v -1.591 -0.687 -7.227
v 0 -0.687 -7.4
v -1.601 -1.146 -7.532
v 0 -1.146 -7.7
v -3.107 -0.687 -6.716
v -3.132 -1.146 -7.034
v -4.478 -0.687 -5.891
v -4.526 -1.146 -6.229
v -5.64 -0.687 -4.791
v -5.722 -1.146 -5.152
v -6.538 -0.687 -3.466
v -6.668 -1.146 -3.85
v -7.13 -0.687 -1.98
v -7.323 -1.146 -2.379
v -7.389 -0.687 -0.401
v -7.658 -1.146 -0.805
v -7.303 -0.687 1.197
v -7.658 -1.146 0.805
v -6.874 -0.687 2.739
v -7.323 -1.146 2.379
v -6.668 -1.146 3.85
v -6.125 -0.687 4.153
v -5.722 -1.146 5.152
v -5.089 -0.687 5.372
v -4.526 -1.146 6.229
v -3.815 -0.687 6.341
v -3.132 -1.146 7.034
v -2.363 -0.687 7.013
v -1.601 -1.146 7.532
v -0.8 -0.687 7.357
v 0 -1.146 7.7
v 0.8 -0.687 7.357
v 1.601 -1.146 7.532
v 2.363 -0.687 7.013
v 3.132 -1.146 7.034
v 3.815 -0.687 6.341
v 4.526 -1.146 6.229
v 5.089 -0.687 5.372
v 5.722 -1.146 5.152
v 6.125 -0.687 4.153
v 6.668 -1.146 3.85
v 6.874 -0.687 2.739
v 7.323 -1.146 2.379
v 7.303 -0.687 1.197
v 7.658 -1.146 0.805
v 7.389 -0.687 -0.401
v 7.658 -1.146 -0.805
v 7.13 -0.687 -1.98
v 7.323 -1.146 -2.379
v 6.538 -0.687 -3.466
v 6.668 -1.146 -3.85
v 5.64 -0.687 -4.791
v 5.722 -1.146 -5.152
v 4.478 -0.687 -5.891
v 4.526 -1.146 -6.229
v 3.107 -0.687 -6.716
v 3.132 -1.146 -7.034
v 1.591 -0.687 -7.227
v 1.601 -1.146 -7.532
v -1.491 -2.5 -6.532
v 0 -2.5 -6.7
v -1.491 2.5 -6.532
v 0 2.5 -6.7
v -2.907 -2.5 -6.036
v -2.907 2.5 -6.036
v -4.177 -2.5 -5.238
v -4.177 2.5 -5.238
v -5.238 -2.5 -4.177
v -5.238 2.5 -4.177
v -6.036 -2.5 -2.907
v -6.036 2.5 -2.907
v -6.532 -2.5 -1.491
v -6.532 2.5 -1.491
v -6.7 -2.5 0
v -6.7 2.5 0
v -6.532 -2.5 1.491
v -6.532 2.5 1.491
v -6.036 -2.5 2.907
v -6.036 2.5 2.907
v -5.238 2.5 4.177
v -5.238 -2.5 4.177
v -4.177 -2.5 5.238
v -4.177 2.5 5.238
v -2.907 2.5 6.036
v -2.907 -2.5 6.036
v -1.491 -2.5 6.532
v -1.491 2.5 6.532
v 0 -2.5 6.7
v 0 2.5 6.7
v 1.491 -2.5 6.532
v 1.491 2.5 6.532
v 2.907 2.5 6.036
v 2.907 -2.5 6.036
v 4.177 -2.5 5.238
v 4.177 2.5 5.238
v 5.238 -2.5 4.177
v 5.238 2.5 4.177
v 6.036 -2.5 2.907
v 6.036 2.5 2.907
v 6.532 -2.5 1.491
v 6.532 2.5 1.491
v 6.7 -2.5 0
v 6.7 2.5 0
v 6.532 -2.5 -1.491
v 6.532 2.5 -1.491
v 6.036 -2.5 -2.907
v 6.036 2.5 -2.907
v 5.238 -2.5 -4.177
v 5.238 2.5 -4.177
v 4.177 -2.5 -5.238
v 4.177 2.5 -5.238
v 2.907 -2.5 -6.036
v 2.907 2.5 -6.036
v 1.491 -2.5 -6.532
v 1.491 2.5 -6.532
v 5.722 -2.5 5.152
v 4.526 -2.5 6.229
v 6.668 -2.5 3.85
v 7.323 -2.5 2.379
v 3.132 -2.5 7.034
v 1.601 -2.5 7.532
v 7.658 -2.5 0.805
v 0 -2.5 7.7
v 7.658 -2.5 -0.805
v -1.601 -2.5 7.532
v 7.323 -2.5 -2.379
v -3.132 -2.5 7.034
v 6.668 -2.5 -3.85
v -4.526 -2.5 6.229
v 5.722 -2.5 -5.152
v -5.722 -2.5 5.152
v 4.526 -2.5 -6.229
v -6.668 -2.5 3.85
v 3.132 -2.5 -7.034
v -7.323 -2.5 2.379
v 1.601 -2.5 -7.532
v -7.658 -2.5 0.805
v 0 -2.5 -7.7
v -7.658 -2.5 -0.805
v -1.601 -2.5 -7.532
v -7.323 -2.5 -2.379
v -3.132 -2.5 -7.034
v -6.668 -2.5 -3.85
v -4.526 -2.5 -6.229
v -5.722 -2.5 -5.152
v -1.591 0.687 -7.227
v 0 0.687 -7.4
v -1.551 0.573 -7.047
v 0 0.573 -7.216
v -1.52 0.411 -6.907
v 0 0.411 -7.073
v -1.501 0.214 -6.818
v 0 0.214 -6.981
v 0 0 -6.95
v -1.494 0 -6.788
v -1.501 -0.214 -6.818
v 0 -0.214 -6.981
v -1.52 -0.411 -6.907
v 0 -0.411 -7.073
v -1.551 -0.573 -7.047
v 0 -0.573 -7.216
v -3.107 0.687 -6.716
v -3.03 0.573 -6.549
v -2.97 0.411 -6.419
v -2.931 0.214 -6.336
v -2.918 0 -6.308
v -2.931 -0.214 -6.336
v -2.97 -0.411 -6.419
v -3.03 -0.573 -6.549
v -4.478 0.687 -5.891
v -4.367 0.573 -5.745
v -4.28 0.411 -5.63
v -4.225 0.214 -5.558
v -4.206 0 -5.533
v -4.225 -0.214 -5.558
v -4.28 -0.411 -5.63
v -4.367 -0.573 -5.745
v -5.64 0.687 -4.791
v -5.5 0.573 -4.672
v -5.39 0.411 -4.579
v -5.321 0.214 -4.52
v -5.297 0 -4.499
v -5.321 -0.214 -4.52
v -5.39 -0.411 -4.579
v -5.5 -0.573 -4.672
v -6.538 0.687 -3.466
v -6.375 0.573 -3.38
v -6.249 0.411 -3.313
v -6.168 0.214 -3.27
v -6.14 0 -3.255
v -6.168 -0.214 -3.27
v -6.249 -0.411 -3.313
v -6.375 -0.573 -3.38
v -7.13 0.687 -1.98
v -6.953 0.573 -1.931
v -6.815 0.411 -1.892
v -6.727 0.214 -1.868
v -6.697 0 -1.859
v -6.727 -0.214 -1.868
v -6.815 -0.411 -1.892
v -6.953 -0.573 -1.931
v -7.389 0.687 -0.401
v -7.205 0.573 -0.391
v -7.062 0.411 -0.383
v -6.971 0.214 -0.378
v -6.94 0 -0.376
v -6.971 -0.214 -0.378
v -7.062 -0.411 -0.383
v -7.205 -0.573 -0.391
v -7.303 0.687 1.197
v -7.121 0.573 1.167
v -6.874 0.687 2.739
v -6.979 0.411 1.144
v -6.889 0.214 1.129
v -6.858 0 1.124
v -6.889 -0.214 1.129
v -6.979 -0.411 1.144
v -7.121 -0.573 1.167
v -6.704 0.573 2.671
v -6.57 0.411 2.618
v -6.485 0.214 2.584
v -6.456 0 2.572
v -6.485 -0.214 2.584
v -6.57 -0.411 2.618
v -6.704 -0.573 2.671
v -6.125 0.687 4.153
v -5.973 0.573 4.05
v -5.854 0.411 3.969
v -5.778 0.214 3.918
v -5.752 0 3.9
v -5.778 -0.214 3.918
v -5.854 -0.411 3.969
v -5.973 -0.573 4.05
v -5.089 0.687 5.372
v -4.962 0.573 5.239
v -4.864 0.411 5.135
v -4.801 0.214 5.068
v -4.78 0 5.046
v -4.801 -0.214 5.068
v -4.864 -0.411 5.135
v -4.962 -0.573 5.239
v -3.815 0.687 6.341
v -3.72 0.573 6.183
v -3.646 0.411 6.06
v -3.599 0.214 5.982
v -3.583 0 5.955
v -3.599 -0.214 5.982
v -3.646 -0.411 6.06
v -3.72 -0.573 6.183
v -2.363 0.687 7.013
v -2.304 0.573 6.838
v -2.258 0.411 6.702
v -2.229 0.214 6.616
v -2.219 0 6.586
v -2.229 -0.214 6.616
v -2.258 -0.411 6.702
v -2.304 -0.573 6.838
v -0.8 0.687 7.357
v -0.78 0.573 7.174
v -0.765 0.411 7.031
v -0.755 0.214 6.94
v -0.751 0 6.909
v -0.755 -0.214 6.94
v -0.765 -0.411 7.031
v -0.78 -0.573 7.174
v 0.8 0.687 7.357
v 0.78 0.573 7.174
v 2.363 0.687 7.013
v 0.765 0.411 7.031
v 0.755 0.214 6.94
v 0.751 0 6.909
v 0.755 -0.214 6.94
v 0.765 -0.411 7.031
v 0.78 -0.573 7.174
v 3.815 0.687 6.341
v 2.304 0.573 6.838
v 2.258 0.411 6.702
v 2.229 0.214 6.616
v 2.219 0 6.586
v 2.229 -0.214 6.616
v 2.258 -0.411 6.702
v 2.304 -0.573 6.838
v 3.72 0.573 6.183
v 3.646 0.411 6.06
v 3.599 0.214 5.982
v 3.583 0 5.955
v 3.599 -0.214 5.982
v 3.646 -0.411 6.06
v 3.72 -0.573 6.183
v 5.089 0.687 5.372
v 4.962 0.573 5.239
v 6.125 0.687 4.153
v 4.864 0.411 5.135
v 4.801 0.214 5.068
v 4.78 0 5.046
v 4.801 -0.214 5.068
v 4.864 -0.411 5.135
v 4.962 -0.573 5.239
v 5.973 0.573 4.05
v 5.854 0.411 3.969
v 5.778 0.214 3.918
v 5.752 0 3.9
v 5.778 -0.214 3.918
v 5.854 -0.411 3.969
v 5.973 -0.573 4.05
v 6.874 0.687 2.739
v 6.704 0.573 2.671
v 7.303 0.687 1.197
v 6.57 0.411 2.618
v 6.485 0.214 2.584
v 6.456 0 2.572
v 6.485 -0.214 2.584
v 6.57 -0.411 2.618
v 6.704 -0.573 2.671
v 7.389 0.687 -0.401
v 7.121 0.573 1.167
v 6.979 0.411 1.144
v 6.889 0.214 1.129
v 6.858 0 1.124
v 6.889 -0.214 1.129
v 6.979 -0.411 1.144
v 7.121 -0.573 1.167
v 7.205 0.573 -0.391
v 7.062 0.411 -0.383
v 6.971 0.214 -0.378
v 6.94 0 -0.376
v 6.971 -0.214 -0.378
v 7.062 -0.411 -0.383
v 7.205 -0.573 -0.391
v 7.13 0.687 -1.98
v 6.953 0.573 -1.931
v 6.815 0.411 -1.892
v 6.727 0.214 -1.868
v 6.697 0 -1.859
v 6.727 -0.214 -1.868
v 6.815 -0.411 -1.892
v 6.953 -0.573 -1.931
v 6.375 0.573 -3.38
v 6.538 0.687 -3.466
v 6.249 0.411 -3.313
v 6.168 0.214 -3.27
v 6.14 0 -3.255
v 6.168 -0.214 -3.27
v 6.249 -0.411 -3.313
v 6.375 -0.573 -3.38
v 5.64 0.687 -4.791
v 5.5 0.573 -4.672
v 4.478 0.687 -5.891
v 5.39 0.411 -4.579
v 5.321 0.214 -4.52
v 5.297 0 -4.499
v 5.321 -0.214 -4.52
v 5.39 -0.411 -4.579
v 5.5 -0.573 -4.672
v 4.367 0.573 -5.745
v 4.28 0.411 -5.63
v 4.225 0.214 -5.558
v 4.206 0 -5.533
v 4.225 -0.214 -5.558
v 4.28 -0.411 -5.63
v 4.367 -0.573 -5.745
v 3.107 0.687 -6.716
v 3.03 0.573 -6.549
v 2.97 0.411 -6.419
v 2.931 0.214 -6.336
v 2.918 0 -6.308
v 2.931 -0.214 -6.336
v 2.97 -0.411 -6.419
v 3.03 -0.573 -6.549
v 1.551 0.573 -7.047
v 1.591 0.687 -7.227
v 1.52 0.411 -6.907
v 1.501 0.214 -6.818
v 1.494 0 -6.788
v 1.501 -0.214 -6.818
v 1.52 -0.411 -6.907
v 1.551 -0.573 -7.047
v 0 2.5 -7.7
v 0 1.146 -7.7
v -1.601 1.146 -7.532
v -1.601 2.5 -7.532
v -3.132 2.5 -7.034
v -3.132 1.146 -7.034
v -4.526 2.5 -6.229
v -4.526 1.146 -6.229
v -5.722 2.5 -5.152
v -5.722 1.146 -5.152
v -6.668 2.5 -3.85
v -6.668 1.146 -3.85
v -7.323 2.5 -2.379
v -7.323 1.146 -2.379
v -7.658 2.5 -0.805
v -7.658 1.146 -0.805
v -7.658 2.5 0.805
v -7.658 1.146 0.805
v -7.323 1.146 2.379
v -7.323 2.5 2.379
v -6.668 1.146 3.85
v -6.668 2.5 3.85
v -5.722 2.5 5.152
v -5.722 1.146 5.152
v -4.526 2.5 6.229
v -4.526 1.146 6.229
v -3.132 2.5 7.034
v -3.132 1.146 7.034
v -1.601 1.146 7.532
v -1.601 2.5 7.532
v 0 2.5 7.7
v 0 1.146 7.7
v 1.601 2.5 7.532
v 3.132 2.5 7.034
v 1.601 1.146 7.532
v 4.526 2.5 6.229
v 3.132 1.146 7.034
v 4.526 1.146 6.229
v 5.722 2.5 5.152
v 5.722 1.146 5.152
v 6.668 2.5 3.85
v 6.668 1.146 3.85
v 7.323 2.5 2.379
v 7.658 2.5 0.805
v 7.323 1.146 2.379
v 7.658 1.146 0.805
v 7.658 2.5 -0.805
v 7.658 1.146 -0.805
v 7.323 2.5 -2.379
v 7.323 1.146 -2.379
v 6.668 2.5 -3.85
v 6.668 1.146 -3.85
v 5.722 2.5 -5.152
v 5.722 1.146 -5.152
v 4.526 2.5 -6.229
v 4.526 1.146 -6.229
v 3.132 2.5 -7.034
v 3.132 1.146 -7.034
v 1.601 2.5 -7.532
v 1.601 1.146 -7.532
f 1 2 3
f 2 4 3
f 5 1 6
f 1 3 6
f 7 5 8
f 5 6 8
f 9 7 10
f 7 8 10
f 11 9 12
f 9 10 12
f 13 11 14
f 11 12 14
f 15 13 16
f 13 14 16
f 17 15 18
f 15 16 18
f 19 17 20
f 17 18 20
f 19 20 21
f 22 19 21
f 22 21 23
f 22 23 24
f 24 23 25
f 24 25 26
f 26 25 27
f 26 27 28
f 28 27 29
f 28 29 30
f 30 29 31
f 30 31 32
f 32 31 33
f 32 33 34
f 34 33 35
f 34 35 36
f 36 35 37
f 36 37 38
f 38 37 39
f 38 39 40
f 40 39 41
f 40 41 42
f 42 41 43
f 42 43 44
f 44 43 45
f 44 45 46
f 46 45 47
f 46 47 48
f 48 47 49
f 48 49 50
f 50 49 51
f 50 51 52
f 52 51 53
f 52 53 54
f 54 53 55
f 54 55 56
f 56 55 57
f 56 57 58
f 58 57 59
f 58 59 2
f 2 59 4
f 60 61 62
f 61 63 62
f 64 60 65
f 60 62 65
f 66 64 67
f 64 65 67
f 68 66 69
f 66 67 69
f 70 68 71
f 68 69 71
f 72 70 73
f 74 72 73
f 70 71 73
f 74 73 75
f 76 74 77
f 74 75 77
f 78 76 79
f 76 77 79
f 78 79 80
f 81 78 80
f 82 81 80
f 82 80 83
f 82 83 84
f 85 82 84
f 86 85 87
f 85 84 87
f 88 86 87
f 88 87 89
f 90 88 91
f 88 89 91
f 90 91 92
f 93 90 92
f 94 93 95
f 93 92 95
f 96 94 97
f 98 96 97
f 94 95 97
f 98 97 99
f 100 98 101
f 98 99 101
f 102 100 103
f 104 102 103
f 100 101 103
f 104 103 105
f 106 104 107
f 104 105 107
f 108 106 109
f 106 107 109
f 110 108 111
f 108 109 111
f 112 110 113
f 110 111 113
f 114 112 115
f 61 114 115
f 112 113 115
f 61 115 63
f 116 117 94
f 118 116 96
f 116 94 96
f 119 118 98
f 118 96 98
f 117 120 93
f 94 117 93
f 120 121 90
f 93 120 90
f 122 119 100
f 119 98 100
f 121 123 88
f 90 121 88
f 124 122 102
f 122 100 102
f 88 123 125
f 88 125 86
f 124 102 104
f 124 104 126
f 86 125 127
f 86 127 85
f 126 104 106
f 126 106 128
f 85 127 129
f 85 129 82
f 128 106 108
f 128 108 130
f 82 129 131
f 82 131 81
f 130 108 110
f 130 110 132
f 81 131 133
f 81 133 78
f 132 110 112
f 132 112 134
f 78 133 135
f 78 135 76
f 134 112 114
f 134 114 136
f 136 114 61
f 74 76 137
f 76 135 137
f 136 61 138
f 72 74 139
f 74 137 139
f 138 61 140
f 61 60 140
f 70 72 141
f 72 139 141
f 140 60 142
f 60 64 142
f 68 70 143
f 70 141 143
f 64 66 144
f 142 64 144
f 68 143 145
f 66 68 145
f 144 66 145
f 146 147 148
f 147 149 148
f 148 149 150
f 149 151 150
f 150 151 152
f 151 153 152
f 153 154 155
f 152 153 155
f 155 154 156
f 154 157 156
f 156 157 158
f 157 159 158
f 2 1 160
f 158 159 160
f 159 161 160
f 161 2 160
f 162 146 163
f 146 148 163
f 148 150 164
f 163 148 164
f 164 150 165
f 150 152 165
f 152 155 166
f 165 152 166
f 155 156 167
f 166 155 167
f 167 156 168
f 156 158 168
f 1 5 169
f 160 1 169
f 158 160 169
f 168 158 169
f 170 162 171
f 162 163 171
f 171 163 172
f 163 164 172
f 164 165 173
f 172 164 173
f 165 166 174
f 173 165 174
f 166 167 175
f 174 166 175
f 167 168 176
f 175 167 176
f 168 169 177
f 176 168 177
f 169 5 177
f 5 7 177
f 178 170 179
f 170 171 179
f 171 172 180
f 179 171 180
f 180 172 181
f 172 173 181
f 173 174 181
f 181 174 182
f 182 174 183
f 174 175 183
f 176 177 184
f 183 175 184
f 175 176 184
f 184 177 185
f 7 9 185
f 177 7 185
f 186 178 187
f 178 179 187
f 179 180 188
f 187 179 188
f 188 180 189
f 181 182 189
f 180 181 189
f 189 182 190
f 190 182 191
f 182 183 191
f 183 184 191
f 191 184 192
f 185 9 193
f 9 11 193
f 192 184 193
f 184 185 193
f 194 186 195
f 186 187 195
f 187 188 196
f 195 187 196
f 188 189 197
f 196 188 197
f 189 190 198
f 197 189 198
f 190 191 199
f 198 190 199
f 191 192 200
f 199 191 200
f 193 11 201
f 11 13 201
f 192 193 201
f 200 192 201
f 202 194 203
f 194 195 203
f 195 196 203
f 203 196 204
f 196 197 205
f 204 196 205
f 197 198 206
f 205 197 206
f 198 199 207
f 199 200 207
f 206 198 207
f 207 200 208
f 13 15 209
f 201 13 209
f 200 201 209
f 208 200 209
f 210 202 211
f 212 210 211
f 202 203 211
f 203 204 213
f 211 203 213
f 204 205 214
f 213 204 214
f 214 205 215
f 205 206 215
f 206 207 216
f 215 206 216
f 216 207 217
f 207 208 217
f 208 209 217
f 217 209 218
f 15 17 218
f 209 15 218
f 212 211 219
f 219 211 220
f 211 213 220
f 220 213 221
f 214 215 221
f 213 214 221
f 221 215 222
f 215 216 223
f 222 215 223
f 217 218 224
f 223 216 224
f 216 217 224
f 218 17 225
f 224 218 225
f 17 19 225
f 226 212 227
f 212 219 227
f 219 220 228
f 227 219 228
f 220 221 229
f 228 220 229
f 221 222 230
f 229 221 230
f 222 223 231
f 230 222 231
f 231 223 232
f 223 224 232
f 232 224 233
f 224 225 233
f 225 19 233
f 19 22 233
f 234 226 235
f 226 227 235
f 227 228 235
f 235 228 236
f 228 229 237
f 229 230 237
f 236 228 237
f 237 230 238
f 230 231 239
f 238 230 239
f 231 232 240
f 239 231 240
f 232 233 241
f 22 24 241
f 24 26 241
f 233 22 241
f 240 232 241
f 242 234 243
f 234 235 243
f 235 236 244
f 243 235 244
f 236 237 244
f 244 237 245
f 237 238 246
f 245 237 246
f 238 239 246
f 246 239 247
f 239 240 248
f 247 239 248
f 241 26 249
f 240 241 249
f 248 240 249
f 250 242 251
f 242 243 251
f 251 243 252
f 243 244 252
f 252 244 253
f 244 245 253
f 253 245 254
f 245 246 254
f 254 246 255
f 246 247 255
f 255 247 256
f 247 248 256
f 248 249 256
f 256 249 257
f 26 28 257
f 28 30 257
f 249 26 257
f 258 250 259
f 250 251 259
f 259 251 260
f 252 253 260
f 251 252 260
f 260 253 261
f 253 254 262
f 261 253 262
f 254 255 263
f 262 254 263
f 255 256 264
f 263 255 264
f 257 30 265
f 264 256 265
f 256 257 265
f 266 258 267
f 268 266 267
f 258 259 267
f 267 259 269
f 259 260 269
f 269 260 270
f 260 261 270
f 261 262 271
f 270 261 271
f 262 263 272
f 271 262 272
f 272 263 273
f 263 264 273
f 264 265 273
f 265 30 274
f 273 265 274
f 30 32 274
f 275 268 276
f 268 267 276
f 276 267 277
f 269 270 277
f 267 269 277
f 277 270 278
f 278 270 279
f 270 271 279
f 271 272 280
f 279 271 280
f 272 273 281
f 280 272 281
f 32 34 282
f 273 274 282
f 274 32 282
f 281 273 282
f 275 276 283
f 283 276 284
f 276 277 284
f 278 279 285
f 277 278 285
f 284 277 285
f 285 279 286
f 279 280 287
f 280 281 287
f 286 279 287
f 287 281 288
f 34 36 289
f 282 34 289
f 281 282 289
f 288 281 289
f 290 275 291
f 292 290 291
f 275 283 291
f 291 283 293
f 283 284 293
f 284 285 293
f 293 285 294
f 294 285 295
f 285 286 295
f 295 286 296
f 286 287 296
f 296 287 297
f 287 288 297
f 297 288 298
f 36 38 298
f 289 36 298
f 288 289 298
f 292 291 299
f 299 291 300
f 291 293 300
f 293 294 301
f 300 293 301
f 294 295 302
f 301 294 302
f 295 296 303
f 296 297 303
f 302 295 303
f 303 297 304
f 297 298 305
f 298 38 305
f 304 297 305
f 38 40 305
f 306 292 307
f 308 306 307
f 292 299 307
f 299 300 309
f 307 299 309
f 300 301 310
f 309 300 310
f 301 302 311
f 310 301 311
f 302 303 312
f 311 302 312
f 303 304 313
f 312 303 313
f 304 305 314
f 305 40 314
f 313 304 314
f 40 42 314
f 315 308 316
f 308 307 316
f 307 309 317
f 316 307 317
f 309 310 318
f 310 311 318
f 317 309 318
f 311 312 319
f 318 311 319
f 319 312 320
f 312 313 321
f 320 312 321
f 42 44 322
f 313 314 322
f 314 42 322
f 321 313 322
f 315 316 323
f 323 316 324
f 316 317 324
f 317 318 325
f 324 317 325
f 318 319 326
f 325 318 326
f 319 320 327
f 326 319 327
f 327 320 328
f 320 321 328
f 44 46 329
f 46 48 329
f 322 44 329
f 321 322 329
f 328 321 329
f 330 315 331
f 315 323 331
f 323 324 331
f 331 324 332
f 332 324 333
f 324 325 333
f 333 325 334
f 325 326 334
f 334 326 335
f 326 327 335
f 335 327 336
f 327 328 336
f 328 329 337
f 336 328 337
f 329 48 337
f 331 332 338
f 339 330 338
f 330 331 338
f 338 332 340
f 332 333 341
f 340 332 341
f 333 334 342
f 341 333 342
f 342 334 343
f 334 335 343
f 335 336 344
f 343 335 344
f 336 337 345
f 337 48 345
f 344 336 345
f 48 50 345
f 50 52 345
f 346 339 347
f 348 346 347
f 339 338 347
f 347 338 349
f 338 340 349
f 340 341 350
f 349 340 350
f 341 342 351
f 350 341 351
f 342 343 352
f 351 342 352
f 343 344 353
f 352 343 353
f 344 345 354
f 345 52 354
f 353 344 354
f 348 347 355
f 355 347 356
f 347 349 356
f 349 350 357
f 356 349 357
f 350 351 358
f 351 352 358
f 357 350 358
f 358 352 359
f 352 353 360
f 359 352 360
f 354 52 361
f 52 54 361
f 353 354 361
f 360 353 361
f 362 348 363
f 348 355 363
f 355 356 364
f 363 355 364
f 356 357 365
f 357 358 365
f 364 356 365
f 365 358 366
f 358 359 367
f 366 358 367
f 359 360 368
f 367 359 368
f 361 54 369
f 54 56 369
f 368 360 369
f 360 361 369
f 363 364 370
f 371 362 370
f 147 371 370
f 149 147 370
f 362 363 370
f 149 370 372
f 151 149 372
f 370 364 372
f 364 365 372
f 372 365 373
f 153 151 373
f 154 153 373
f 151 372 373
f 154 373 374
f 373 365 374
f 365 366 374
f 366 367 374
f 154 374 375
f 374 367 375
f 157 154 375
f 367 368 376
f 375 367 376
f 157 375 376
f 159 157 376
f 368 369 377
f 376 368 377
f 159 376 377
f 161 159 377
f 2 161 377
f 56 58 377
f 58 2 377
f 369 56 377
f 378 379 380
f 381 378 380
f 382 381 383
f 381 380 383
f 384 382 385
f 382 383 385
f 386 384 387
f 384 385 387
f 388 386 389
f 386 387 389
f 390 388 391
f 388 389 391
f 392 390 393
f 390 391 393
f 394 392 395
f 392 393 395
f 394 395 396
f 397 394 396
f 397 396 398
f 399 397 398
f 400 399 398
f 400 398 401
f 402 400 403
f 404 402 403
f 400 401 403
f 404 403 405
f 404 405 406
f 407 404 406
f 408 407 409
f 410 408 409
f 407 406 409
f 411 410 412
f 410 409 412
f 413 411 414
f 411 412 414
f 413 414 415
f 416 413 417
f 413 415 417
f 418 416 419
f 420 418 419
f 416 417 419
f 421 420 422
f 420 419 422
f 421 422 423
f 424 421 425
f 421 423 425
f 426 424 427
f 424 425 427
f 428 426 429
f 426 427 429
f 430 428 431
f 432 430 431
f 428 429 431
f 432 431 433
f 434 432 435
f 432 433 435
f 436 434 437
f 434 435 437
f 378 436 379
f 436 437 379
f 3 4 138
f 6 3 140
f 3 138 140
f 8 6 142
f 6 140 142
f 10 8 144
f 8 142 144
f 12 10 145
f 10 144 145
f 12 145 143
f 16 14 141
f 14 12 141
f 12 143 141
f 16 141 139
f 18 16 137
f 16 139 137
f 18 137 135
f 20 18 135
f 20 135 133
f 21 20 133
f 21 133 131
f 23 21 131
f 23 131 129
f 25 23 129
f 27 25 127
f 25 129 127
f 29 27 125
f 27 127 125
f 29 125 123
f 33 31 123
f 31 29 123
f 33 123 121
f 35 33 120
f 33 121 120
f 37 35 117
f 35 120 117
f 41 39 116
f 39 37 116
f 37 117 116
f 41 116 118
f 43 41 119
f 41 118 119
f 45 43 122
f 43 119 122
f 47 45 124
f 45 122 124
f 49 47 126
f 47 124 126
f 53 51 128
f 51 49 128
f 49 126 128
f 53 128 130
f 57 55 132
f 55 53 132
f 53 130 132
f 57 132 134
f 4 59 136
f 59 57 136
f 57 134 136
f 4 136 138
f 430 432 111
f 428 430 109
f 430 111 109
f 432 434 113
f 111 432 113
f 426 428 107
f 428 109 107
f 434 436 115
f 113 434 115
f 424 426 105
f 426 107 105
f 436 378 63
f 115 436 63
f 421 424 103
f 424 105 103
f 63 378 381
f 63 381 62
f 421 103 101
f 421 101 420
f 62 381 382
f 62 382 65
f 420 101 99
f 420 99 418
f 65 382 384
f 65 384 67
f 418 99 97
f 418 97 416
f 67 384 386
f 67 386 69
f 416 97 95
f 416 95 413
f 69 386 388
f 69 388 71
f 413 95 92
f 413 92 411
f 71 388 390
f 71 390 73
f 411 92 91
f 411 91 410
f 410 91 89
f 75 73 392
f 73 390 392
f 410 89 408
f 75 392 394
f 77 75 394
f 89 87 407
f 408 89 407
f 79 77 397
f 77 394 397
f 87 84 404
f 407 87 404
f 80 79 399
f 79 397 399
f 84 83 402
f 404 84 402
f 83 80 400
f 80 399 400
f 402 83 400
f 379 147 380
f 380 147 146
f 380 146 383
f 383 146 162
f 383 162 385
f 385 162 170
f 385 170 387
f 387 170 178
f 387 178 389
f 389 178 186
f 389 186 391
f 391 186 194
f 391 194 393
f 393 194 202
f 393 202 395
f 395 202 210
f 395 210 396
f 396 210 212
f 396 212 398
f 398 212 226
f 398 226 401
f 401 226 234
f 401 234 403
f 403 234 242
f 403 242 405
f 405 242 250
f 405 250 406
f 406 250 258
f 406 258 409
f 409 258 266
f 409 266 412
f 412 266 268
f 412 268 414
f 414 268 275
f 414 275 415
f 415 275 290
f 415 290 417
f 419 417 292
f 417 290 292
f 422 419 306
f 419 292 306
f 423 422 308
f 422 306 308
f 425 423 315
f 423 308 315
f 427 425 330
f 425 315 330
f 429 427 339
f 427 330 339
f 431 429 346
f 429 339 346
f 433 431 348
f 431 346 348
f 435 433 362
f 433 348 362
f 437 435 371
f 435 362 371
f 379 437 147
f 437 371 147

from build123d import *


with BuildPart() as part:
    # Sketch1 → Revolve1 (revolve)
    with BuildSketch(Plane.XY, mode=Mode.PRIVATE) as revolve1_sk:
        with BuildLine():
            Line((6.7, -2.5), (6.7, 2.5))
            Line((6.7, 2.5), (7.7, 2.5))
            Line((7.7, 2.5), (7.7, 0.75))
            ThreePointArc((7.7, 0.75), (6.95, 0), (7.7, -0.75))
            Line((7.7, -0.75), (7.7, -2.5))
            Line((7.7, -2.5), (6.7, -2.5))
        make_face()
    revolve(revolve1_sk.sketch.rotate(Axis((0, 0, 0), (0, 1, 0)), 90), axis=Axis((0, 0, 0), (0, 1, 0)))

    # Chamfer1
    # the kernel refuses this chamfer: 0.5 mm, written as the material it takes off along each edge
    with BuildSketch(Plane(origin=(0, -0.75, 0), x_dir=(0, 0, -1), z_dir=(1, 0, 0))) as chamfer1_piece_1:
        with BuildLine():
            Line((7.389045549, 0.079346846), (7.710954451, -0.412377124))
            Line((7.710954451, -0.412377124), (7.720954451, -0.412377124))
            ThreePointArc((7.720954451, -0.412377124), (7.71, -0.206188562), (7.71, 0))
            Line((7.71, 0), (7.7, 0.01))
            ThreePointArc((7.7, 0.01), (7.54177371, 0.027113812), (7.393045549, 0.088511998))
            Line((7.393045549, 0.088511998), (7.389045549, 0.079346846))
        make_face()
    revolve(axis=Axis((0, -0.75, 0), (0, 1, 0)), mode=Mode.SUBTRACT)
    with BuildSketch(Plane(origin=(0, 0.75, 0), x_dir=(0, 0, -1), z_dir=(1, 0, 0))) as chamfer1_piece_2:
        with BuildLine():
            Line((7.710954451, 0.412377124), (7.389045549, -0.079346846))
            Line((7.389045549, -0.079346846), (7.393045549, -0.088511998))
            ThreePointArc((7.393045549, -0.088511998), (7.54177371, -0.027113812), (7.7, -0.01))
            Line((7.7, -0.01), (7.71, 0))
            ThreePointArc((7.71, 0), (7.71, 0.206188562), (7.720954451, 0.412377124))
            Line((7.720954451, 0.412377124), (7.710954451, 0.412377124))
        make_face()
    revolve(axis=Axis((0, 0.75, 0), (0, 1, 0)), mode=Mode.SUBTRACT)


solid = part.part
